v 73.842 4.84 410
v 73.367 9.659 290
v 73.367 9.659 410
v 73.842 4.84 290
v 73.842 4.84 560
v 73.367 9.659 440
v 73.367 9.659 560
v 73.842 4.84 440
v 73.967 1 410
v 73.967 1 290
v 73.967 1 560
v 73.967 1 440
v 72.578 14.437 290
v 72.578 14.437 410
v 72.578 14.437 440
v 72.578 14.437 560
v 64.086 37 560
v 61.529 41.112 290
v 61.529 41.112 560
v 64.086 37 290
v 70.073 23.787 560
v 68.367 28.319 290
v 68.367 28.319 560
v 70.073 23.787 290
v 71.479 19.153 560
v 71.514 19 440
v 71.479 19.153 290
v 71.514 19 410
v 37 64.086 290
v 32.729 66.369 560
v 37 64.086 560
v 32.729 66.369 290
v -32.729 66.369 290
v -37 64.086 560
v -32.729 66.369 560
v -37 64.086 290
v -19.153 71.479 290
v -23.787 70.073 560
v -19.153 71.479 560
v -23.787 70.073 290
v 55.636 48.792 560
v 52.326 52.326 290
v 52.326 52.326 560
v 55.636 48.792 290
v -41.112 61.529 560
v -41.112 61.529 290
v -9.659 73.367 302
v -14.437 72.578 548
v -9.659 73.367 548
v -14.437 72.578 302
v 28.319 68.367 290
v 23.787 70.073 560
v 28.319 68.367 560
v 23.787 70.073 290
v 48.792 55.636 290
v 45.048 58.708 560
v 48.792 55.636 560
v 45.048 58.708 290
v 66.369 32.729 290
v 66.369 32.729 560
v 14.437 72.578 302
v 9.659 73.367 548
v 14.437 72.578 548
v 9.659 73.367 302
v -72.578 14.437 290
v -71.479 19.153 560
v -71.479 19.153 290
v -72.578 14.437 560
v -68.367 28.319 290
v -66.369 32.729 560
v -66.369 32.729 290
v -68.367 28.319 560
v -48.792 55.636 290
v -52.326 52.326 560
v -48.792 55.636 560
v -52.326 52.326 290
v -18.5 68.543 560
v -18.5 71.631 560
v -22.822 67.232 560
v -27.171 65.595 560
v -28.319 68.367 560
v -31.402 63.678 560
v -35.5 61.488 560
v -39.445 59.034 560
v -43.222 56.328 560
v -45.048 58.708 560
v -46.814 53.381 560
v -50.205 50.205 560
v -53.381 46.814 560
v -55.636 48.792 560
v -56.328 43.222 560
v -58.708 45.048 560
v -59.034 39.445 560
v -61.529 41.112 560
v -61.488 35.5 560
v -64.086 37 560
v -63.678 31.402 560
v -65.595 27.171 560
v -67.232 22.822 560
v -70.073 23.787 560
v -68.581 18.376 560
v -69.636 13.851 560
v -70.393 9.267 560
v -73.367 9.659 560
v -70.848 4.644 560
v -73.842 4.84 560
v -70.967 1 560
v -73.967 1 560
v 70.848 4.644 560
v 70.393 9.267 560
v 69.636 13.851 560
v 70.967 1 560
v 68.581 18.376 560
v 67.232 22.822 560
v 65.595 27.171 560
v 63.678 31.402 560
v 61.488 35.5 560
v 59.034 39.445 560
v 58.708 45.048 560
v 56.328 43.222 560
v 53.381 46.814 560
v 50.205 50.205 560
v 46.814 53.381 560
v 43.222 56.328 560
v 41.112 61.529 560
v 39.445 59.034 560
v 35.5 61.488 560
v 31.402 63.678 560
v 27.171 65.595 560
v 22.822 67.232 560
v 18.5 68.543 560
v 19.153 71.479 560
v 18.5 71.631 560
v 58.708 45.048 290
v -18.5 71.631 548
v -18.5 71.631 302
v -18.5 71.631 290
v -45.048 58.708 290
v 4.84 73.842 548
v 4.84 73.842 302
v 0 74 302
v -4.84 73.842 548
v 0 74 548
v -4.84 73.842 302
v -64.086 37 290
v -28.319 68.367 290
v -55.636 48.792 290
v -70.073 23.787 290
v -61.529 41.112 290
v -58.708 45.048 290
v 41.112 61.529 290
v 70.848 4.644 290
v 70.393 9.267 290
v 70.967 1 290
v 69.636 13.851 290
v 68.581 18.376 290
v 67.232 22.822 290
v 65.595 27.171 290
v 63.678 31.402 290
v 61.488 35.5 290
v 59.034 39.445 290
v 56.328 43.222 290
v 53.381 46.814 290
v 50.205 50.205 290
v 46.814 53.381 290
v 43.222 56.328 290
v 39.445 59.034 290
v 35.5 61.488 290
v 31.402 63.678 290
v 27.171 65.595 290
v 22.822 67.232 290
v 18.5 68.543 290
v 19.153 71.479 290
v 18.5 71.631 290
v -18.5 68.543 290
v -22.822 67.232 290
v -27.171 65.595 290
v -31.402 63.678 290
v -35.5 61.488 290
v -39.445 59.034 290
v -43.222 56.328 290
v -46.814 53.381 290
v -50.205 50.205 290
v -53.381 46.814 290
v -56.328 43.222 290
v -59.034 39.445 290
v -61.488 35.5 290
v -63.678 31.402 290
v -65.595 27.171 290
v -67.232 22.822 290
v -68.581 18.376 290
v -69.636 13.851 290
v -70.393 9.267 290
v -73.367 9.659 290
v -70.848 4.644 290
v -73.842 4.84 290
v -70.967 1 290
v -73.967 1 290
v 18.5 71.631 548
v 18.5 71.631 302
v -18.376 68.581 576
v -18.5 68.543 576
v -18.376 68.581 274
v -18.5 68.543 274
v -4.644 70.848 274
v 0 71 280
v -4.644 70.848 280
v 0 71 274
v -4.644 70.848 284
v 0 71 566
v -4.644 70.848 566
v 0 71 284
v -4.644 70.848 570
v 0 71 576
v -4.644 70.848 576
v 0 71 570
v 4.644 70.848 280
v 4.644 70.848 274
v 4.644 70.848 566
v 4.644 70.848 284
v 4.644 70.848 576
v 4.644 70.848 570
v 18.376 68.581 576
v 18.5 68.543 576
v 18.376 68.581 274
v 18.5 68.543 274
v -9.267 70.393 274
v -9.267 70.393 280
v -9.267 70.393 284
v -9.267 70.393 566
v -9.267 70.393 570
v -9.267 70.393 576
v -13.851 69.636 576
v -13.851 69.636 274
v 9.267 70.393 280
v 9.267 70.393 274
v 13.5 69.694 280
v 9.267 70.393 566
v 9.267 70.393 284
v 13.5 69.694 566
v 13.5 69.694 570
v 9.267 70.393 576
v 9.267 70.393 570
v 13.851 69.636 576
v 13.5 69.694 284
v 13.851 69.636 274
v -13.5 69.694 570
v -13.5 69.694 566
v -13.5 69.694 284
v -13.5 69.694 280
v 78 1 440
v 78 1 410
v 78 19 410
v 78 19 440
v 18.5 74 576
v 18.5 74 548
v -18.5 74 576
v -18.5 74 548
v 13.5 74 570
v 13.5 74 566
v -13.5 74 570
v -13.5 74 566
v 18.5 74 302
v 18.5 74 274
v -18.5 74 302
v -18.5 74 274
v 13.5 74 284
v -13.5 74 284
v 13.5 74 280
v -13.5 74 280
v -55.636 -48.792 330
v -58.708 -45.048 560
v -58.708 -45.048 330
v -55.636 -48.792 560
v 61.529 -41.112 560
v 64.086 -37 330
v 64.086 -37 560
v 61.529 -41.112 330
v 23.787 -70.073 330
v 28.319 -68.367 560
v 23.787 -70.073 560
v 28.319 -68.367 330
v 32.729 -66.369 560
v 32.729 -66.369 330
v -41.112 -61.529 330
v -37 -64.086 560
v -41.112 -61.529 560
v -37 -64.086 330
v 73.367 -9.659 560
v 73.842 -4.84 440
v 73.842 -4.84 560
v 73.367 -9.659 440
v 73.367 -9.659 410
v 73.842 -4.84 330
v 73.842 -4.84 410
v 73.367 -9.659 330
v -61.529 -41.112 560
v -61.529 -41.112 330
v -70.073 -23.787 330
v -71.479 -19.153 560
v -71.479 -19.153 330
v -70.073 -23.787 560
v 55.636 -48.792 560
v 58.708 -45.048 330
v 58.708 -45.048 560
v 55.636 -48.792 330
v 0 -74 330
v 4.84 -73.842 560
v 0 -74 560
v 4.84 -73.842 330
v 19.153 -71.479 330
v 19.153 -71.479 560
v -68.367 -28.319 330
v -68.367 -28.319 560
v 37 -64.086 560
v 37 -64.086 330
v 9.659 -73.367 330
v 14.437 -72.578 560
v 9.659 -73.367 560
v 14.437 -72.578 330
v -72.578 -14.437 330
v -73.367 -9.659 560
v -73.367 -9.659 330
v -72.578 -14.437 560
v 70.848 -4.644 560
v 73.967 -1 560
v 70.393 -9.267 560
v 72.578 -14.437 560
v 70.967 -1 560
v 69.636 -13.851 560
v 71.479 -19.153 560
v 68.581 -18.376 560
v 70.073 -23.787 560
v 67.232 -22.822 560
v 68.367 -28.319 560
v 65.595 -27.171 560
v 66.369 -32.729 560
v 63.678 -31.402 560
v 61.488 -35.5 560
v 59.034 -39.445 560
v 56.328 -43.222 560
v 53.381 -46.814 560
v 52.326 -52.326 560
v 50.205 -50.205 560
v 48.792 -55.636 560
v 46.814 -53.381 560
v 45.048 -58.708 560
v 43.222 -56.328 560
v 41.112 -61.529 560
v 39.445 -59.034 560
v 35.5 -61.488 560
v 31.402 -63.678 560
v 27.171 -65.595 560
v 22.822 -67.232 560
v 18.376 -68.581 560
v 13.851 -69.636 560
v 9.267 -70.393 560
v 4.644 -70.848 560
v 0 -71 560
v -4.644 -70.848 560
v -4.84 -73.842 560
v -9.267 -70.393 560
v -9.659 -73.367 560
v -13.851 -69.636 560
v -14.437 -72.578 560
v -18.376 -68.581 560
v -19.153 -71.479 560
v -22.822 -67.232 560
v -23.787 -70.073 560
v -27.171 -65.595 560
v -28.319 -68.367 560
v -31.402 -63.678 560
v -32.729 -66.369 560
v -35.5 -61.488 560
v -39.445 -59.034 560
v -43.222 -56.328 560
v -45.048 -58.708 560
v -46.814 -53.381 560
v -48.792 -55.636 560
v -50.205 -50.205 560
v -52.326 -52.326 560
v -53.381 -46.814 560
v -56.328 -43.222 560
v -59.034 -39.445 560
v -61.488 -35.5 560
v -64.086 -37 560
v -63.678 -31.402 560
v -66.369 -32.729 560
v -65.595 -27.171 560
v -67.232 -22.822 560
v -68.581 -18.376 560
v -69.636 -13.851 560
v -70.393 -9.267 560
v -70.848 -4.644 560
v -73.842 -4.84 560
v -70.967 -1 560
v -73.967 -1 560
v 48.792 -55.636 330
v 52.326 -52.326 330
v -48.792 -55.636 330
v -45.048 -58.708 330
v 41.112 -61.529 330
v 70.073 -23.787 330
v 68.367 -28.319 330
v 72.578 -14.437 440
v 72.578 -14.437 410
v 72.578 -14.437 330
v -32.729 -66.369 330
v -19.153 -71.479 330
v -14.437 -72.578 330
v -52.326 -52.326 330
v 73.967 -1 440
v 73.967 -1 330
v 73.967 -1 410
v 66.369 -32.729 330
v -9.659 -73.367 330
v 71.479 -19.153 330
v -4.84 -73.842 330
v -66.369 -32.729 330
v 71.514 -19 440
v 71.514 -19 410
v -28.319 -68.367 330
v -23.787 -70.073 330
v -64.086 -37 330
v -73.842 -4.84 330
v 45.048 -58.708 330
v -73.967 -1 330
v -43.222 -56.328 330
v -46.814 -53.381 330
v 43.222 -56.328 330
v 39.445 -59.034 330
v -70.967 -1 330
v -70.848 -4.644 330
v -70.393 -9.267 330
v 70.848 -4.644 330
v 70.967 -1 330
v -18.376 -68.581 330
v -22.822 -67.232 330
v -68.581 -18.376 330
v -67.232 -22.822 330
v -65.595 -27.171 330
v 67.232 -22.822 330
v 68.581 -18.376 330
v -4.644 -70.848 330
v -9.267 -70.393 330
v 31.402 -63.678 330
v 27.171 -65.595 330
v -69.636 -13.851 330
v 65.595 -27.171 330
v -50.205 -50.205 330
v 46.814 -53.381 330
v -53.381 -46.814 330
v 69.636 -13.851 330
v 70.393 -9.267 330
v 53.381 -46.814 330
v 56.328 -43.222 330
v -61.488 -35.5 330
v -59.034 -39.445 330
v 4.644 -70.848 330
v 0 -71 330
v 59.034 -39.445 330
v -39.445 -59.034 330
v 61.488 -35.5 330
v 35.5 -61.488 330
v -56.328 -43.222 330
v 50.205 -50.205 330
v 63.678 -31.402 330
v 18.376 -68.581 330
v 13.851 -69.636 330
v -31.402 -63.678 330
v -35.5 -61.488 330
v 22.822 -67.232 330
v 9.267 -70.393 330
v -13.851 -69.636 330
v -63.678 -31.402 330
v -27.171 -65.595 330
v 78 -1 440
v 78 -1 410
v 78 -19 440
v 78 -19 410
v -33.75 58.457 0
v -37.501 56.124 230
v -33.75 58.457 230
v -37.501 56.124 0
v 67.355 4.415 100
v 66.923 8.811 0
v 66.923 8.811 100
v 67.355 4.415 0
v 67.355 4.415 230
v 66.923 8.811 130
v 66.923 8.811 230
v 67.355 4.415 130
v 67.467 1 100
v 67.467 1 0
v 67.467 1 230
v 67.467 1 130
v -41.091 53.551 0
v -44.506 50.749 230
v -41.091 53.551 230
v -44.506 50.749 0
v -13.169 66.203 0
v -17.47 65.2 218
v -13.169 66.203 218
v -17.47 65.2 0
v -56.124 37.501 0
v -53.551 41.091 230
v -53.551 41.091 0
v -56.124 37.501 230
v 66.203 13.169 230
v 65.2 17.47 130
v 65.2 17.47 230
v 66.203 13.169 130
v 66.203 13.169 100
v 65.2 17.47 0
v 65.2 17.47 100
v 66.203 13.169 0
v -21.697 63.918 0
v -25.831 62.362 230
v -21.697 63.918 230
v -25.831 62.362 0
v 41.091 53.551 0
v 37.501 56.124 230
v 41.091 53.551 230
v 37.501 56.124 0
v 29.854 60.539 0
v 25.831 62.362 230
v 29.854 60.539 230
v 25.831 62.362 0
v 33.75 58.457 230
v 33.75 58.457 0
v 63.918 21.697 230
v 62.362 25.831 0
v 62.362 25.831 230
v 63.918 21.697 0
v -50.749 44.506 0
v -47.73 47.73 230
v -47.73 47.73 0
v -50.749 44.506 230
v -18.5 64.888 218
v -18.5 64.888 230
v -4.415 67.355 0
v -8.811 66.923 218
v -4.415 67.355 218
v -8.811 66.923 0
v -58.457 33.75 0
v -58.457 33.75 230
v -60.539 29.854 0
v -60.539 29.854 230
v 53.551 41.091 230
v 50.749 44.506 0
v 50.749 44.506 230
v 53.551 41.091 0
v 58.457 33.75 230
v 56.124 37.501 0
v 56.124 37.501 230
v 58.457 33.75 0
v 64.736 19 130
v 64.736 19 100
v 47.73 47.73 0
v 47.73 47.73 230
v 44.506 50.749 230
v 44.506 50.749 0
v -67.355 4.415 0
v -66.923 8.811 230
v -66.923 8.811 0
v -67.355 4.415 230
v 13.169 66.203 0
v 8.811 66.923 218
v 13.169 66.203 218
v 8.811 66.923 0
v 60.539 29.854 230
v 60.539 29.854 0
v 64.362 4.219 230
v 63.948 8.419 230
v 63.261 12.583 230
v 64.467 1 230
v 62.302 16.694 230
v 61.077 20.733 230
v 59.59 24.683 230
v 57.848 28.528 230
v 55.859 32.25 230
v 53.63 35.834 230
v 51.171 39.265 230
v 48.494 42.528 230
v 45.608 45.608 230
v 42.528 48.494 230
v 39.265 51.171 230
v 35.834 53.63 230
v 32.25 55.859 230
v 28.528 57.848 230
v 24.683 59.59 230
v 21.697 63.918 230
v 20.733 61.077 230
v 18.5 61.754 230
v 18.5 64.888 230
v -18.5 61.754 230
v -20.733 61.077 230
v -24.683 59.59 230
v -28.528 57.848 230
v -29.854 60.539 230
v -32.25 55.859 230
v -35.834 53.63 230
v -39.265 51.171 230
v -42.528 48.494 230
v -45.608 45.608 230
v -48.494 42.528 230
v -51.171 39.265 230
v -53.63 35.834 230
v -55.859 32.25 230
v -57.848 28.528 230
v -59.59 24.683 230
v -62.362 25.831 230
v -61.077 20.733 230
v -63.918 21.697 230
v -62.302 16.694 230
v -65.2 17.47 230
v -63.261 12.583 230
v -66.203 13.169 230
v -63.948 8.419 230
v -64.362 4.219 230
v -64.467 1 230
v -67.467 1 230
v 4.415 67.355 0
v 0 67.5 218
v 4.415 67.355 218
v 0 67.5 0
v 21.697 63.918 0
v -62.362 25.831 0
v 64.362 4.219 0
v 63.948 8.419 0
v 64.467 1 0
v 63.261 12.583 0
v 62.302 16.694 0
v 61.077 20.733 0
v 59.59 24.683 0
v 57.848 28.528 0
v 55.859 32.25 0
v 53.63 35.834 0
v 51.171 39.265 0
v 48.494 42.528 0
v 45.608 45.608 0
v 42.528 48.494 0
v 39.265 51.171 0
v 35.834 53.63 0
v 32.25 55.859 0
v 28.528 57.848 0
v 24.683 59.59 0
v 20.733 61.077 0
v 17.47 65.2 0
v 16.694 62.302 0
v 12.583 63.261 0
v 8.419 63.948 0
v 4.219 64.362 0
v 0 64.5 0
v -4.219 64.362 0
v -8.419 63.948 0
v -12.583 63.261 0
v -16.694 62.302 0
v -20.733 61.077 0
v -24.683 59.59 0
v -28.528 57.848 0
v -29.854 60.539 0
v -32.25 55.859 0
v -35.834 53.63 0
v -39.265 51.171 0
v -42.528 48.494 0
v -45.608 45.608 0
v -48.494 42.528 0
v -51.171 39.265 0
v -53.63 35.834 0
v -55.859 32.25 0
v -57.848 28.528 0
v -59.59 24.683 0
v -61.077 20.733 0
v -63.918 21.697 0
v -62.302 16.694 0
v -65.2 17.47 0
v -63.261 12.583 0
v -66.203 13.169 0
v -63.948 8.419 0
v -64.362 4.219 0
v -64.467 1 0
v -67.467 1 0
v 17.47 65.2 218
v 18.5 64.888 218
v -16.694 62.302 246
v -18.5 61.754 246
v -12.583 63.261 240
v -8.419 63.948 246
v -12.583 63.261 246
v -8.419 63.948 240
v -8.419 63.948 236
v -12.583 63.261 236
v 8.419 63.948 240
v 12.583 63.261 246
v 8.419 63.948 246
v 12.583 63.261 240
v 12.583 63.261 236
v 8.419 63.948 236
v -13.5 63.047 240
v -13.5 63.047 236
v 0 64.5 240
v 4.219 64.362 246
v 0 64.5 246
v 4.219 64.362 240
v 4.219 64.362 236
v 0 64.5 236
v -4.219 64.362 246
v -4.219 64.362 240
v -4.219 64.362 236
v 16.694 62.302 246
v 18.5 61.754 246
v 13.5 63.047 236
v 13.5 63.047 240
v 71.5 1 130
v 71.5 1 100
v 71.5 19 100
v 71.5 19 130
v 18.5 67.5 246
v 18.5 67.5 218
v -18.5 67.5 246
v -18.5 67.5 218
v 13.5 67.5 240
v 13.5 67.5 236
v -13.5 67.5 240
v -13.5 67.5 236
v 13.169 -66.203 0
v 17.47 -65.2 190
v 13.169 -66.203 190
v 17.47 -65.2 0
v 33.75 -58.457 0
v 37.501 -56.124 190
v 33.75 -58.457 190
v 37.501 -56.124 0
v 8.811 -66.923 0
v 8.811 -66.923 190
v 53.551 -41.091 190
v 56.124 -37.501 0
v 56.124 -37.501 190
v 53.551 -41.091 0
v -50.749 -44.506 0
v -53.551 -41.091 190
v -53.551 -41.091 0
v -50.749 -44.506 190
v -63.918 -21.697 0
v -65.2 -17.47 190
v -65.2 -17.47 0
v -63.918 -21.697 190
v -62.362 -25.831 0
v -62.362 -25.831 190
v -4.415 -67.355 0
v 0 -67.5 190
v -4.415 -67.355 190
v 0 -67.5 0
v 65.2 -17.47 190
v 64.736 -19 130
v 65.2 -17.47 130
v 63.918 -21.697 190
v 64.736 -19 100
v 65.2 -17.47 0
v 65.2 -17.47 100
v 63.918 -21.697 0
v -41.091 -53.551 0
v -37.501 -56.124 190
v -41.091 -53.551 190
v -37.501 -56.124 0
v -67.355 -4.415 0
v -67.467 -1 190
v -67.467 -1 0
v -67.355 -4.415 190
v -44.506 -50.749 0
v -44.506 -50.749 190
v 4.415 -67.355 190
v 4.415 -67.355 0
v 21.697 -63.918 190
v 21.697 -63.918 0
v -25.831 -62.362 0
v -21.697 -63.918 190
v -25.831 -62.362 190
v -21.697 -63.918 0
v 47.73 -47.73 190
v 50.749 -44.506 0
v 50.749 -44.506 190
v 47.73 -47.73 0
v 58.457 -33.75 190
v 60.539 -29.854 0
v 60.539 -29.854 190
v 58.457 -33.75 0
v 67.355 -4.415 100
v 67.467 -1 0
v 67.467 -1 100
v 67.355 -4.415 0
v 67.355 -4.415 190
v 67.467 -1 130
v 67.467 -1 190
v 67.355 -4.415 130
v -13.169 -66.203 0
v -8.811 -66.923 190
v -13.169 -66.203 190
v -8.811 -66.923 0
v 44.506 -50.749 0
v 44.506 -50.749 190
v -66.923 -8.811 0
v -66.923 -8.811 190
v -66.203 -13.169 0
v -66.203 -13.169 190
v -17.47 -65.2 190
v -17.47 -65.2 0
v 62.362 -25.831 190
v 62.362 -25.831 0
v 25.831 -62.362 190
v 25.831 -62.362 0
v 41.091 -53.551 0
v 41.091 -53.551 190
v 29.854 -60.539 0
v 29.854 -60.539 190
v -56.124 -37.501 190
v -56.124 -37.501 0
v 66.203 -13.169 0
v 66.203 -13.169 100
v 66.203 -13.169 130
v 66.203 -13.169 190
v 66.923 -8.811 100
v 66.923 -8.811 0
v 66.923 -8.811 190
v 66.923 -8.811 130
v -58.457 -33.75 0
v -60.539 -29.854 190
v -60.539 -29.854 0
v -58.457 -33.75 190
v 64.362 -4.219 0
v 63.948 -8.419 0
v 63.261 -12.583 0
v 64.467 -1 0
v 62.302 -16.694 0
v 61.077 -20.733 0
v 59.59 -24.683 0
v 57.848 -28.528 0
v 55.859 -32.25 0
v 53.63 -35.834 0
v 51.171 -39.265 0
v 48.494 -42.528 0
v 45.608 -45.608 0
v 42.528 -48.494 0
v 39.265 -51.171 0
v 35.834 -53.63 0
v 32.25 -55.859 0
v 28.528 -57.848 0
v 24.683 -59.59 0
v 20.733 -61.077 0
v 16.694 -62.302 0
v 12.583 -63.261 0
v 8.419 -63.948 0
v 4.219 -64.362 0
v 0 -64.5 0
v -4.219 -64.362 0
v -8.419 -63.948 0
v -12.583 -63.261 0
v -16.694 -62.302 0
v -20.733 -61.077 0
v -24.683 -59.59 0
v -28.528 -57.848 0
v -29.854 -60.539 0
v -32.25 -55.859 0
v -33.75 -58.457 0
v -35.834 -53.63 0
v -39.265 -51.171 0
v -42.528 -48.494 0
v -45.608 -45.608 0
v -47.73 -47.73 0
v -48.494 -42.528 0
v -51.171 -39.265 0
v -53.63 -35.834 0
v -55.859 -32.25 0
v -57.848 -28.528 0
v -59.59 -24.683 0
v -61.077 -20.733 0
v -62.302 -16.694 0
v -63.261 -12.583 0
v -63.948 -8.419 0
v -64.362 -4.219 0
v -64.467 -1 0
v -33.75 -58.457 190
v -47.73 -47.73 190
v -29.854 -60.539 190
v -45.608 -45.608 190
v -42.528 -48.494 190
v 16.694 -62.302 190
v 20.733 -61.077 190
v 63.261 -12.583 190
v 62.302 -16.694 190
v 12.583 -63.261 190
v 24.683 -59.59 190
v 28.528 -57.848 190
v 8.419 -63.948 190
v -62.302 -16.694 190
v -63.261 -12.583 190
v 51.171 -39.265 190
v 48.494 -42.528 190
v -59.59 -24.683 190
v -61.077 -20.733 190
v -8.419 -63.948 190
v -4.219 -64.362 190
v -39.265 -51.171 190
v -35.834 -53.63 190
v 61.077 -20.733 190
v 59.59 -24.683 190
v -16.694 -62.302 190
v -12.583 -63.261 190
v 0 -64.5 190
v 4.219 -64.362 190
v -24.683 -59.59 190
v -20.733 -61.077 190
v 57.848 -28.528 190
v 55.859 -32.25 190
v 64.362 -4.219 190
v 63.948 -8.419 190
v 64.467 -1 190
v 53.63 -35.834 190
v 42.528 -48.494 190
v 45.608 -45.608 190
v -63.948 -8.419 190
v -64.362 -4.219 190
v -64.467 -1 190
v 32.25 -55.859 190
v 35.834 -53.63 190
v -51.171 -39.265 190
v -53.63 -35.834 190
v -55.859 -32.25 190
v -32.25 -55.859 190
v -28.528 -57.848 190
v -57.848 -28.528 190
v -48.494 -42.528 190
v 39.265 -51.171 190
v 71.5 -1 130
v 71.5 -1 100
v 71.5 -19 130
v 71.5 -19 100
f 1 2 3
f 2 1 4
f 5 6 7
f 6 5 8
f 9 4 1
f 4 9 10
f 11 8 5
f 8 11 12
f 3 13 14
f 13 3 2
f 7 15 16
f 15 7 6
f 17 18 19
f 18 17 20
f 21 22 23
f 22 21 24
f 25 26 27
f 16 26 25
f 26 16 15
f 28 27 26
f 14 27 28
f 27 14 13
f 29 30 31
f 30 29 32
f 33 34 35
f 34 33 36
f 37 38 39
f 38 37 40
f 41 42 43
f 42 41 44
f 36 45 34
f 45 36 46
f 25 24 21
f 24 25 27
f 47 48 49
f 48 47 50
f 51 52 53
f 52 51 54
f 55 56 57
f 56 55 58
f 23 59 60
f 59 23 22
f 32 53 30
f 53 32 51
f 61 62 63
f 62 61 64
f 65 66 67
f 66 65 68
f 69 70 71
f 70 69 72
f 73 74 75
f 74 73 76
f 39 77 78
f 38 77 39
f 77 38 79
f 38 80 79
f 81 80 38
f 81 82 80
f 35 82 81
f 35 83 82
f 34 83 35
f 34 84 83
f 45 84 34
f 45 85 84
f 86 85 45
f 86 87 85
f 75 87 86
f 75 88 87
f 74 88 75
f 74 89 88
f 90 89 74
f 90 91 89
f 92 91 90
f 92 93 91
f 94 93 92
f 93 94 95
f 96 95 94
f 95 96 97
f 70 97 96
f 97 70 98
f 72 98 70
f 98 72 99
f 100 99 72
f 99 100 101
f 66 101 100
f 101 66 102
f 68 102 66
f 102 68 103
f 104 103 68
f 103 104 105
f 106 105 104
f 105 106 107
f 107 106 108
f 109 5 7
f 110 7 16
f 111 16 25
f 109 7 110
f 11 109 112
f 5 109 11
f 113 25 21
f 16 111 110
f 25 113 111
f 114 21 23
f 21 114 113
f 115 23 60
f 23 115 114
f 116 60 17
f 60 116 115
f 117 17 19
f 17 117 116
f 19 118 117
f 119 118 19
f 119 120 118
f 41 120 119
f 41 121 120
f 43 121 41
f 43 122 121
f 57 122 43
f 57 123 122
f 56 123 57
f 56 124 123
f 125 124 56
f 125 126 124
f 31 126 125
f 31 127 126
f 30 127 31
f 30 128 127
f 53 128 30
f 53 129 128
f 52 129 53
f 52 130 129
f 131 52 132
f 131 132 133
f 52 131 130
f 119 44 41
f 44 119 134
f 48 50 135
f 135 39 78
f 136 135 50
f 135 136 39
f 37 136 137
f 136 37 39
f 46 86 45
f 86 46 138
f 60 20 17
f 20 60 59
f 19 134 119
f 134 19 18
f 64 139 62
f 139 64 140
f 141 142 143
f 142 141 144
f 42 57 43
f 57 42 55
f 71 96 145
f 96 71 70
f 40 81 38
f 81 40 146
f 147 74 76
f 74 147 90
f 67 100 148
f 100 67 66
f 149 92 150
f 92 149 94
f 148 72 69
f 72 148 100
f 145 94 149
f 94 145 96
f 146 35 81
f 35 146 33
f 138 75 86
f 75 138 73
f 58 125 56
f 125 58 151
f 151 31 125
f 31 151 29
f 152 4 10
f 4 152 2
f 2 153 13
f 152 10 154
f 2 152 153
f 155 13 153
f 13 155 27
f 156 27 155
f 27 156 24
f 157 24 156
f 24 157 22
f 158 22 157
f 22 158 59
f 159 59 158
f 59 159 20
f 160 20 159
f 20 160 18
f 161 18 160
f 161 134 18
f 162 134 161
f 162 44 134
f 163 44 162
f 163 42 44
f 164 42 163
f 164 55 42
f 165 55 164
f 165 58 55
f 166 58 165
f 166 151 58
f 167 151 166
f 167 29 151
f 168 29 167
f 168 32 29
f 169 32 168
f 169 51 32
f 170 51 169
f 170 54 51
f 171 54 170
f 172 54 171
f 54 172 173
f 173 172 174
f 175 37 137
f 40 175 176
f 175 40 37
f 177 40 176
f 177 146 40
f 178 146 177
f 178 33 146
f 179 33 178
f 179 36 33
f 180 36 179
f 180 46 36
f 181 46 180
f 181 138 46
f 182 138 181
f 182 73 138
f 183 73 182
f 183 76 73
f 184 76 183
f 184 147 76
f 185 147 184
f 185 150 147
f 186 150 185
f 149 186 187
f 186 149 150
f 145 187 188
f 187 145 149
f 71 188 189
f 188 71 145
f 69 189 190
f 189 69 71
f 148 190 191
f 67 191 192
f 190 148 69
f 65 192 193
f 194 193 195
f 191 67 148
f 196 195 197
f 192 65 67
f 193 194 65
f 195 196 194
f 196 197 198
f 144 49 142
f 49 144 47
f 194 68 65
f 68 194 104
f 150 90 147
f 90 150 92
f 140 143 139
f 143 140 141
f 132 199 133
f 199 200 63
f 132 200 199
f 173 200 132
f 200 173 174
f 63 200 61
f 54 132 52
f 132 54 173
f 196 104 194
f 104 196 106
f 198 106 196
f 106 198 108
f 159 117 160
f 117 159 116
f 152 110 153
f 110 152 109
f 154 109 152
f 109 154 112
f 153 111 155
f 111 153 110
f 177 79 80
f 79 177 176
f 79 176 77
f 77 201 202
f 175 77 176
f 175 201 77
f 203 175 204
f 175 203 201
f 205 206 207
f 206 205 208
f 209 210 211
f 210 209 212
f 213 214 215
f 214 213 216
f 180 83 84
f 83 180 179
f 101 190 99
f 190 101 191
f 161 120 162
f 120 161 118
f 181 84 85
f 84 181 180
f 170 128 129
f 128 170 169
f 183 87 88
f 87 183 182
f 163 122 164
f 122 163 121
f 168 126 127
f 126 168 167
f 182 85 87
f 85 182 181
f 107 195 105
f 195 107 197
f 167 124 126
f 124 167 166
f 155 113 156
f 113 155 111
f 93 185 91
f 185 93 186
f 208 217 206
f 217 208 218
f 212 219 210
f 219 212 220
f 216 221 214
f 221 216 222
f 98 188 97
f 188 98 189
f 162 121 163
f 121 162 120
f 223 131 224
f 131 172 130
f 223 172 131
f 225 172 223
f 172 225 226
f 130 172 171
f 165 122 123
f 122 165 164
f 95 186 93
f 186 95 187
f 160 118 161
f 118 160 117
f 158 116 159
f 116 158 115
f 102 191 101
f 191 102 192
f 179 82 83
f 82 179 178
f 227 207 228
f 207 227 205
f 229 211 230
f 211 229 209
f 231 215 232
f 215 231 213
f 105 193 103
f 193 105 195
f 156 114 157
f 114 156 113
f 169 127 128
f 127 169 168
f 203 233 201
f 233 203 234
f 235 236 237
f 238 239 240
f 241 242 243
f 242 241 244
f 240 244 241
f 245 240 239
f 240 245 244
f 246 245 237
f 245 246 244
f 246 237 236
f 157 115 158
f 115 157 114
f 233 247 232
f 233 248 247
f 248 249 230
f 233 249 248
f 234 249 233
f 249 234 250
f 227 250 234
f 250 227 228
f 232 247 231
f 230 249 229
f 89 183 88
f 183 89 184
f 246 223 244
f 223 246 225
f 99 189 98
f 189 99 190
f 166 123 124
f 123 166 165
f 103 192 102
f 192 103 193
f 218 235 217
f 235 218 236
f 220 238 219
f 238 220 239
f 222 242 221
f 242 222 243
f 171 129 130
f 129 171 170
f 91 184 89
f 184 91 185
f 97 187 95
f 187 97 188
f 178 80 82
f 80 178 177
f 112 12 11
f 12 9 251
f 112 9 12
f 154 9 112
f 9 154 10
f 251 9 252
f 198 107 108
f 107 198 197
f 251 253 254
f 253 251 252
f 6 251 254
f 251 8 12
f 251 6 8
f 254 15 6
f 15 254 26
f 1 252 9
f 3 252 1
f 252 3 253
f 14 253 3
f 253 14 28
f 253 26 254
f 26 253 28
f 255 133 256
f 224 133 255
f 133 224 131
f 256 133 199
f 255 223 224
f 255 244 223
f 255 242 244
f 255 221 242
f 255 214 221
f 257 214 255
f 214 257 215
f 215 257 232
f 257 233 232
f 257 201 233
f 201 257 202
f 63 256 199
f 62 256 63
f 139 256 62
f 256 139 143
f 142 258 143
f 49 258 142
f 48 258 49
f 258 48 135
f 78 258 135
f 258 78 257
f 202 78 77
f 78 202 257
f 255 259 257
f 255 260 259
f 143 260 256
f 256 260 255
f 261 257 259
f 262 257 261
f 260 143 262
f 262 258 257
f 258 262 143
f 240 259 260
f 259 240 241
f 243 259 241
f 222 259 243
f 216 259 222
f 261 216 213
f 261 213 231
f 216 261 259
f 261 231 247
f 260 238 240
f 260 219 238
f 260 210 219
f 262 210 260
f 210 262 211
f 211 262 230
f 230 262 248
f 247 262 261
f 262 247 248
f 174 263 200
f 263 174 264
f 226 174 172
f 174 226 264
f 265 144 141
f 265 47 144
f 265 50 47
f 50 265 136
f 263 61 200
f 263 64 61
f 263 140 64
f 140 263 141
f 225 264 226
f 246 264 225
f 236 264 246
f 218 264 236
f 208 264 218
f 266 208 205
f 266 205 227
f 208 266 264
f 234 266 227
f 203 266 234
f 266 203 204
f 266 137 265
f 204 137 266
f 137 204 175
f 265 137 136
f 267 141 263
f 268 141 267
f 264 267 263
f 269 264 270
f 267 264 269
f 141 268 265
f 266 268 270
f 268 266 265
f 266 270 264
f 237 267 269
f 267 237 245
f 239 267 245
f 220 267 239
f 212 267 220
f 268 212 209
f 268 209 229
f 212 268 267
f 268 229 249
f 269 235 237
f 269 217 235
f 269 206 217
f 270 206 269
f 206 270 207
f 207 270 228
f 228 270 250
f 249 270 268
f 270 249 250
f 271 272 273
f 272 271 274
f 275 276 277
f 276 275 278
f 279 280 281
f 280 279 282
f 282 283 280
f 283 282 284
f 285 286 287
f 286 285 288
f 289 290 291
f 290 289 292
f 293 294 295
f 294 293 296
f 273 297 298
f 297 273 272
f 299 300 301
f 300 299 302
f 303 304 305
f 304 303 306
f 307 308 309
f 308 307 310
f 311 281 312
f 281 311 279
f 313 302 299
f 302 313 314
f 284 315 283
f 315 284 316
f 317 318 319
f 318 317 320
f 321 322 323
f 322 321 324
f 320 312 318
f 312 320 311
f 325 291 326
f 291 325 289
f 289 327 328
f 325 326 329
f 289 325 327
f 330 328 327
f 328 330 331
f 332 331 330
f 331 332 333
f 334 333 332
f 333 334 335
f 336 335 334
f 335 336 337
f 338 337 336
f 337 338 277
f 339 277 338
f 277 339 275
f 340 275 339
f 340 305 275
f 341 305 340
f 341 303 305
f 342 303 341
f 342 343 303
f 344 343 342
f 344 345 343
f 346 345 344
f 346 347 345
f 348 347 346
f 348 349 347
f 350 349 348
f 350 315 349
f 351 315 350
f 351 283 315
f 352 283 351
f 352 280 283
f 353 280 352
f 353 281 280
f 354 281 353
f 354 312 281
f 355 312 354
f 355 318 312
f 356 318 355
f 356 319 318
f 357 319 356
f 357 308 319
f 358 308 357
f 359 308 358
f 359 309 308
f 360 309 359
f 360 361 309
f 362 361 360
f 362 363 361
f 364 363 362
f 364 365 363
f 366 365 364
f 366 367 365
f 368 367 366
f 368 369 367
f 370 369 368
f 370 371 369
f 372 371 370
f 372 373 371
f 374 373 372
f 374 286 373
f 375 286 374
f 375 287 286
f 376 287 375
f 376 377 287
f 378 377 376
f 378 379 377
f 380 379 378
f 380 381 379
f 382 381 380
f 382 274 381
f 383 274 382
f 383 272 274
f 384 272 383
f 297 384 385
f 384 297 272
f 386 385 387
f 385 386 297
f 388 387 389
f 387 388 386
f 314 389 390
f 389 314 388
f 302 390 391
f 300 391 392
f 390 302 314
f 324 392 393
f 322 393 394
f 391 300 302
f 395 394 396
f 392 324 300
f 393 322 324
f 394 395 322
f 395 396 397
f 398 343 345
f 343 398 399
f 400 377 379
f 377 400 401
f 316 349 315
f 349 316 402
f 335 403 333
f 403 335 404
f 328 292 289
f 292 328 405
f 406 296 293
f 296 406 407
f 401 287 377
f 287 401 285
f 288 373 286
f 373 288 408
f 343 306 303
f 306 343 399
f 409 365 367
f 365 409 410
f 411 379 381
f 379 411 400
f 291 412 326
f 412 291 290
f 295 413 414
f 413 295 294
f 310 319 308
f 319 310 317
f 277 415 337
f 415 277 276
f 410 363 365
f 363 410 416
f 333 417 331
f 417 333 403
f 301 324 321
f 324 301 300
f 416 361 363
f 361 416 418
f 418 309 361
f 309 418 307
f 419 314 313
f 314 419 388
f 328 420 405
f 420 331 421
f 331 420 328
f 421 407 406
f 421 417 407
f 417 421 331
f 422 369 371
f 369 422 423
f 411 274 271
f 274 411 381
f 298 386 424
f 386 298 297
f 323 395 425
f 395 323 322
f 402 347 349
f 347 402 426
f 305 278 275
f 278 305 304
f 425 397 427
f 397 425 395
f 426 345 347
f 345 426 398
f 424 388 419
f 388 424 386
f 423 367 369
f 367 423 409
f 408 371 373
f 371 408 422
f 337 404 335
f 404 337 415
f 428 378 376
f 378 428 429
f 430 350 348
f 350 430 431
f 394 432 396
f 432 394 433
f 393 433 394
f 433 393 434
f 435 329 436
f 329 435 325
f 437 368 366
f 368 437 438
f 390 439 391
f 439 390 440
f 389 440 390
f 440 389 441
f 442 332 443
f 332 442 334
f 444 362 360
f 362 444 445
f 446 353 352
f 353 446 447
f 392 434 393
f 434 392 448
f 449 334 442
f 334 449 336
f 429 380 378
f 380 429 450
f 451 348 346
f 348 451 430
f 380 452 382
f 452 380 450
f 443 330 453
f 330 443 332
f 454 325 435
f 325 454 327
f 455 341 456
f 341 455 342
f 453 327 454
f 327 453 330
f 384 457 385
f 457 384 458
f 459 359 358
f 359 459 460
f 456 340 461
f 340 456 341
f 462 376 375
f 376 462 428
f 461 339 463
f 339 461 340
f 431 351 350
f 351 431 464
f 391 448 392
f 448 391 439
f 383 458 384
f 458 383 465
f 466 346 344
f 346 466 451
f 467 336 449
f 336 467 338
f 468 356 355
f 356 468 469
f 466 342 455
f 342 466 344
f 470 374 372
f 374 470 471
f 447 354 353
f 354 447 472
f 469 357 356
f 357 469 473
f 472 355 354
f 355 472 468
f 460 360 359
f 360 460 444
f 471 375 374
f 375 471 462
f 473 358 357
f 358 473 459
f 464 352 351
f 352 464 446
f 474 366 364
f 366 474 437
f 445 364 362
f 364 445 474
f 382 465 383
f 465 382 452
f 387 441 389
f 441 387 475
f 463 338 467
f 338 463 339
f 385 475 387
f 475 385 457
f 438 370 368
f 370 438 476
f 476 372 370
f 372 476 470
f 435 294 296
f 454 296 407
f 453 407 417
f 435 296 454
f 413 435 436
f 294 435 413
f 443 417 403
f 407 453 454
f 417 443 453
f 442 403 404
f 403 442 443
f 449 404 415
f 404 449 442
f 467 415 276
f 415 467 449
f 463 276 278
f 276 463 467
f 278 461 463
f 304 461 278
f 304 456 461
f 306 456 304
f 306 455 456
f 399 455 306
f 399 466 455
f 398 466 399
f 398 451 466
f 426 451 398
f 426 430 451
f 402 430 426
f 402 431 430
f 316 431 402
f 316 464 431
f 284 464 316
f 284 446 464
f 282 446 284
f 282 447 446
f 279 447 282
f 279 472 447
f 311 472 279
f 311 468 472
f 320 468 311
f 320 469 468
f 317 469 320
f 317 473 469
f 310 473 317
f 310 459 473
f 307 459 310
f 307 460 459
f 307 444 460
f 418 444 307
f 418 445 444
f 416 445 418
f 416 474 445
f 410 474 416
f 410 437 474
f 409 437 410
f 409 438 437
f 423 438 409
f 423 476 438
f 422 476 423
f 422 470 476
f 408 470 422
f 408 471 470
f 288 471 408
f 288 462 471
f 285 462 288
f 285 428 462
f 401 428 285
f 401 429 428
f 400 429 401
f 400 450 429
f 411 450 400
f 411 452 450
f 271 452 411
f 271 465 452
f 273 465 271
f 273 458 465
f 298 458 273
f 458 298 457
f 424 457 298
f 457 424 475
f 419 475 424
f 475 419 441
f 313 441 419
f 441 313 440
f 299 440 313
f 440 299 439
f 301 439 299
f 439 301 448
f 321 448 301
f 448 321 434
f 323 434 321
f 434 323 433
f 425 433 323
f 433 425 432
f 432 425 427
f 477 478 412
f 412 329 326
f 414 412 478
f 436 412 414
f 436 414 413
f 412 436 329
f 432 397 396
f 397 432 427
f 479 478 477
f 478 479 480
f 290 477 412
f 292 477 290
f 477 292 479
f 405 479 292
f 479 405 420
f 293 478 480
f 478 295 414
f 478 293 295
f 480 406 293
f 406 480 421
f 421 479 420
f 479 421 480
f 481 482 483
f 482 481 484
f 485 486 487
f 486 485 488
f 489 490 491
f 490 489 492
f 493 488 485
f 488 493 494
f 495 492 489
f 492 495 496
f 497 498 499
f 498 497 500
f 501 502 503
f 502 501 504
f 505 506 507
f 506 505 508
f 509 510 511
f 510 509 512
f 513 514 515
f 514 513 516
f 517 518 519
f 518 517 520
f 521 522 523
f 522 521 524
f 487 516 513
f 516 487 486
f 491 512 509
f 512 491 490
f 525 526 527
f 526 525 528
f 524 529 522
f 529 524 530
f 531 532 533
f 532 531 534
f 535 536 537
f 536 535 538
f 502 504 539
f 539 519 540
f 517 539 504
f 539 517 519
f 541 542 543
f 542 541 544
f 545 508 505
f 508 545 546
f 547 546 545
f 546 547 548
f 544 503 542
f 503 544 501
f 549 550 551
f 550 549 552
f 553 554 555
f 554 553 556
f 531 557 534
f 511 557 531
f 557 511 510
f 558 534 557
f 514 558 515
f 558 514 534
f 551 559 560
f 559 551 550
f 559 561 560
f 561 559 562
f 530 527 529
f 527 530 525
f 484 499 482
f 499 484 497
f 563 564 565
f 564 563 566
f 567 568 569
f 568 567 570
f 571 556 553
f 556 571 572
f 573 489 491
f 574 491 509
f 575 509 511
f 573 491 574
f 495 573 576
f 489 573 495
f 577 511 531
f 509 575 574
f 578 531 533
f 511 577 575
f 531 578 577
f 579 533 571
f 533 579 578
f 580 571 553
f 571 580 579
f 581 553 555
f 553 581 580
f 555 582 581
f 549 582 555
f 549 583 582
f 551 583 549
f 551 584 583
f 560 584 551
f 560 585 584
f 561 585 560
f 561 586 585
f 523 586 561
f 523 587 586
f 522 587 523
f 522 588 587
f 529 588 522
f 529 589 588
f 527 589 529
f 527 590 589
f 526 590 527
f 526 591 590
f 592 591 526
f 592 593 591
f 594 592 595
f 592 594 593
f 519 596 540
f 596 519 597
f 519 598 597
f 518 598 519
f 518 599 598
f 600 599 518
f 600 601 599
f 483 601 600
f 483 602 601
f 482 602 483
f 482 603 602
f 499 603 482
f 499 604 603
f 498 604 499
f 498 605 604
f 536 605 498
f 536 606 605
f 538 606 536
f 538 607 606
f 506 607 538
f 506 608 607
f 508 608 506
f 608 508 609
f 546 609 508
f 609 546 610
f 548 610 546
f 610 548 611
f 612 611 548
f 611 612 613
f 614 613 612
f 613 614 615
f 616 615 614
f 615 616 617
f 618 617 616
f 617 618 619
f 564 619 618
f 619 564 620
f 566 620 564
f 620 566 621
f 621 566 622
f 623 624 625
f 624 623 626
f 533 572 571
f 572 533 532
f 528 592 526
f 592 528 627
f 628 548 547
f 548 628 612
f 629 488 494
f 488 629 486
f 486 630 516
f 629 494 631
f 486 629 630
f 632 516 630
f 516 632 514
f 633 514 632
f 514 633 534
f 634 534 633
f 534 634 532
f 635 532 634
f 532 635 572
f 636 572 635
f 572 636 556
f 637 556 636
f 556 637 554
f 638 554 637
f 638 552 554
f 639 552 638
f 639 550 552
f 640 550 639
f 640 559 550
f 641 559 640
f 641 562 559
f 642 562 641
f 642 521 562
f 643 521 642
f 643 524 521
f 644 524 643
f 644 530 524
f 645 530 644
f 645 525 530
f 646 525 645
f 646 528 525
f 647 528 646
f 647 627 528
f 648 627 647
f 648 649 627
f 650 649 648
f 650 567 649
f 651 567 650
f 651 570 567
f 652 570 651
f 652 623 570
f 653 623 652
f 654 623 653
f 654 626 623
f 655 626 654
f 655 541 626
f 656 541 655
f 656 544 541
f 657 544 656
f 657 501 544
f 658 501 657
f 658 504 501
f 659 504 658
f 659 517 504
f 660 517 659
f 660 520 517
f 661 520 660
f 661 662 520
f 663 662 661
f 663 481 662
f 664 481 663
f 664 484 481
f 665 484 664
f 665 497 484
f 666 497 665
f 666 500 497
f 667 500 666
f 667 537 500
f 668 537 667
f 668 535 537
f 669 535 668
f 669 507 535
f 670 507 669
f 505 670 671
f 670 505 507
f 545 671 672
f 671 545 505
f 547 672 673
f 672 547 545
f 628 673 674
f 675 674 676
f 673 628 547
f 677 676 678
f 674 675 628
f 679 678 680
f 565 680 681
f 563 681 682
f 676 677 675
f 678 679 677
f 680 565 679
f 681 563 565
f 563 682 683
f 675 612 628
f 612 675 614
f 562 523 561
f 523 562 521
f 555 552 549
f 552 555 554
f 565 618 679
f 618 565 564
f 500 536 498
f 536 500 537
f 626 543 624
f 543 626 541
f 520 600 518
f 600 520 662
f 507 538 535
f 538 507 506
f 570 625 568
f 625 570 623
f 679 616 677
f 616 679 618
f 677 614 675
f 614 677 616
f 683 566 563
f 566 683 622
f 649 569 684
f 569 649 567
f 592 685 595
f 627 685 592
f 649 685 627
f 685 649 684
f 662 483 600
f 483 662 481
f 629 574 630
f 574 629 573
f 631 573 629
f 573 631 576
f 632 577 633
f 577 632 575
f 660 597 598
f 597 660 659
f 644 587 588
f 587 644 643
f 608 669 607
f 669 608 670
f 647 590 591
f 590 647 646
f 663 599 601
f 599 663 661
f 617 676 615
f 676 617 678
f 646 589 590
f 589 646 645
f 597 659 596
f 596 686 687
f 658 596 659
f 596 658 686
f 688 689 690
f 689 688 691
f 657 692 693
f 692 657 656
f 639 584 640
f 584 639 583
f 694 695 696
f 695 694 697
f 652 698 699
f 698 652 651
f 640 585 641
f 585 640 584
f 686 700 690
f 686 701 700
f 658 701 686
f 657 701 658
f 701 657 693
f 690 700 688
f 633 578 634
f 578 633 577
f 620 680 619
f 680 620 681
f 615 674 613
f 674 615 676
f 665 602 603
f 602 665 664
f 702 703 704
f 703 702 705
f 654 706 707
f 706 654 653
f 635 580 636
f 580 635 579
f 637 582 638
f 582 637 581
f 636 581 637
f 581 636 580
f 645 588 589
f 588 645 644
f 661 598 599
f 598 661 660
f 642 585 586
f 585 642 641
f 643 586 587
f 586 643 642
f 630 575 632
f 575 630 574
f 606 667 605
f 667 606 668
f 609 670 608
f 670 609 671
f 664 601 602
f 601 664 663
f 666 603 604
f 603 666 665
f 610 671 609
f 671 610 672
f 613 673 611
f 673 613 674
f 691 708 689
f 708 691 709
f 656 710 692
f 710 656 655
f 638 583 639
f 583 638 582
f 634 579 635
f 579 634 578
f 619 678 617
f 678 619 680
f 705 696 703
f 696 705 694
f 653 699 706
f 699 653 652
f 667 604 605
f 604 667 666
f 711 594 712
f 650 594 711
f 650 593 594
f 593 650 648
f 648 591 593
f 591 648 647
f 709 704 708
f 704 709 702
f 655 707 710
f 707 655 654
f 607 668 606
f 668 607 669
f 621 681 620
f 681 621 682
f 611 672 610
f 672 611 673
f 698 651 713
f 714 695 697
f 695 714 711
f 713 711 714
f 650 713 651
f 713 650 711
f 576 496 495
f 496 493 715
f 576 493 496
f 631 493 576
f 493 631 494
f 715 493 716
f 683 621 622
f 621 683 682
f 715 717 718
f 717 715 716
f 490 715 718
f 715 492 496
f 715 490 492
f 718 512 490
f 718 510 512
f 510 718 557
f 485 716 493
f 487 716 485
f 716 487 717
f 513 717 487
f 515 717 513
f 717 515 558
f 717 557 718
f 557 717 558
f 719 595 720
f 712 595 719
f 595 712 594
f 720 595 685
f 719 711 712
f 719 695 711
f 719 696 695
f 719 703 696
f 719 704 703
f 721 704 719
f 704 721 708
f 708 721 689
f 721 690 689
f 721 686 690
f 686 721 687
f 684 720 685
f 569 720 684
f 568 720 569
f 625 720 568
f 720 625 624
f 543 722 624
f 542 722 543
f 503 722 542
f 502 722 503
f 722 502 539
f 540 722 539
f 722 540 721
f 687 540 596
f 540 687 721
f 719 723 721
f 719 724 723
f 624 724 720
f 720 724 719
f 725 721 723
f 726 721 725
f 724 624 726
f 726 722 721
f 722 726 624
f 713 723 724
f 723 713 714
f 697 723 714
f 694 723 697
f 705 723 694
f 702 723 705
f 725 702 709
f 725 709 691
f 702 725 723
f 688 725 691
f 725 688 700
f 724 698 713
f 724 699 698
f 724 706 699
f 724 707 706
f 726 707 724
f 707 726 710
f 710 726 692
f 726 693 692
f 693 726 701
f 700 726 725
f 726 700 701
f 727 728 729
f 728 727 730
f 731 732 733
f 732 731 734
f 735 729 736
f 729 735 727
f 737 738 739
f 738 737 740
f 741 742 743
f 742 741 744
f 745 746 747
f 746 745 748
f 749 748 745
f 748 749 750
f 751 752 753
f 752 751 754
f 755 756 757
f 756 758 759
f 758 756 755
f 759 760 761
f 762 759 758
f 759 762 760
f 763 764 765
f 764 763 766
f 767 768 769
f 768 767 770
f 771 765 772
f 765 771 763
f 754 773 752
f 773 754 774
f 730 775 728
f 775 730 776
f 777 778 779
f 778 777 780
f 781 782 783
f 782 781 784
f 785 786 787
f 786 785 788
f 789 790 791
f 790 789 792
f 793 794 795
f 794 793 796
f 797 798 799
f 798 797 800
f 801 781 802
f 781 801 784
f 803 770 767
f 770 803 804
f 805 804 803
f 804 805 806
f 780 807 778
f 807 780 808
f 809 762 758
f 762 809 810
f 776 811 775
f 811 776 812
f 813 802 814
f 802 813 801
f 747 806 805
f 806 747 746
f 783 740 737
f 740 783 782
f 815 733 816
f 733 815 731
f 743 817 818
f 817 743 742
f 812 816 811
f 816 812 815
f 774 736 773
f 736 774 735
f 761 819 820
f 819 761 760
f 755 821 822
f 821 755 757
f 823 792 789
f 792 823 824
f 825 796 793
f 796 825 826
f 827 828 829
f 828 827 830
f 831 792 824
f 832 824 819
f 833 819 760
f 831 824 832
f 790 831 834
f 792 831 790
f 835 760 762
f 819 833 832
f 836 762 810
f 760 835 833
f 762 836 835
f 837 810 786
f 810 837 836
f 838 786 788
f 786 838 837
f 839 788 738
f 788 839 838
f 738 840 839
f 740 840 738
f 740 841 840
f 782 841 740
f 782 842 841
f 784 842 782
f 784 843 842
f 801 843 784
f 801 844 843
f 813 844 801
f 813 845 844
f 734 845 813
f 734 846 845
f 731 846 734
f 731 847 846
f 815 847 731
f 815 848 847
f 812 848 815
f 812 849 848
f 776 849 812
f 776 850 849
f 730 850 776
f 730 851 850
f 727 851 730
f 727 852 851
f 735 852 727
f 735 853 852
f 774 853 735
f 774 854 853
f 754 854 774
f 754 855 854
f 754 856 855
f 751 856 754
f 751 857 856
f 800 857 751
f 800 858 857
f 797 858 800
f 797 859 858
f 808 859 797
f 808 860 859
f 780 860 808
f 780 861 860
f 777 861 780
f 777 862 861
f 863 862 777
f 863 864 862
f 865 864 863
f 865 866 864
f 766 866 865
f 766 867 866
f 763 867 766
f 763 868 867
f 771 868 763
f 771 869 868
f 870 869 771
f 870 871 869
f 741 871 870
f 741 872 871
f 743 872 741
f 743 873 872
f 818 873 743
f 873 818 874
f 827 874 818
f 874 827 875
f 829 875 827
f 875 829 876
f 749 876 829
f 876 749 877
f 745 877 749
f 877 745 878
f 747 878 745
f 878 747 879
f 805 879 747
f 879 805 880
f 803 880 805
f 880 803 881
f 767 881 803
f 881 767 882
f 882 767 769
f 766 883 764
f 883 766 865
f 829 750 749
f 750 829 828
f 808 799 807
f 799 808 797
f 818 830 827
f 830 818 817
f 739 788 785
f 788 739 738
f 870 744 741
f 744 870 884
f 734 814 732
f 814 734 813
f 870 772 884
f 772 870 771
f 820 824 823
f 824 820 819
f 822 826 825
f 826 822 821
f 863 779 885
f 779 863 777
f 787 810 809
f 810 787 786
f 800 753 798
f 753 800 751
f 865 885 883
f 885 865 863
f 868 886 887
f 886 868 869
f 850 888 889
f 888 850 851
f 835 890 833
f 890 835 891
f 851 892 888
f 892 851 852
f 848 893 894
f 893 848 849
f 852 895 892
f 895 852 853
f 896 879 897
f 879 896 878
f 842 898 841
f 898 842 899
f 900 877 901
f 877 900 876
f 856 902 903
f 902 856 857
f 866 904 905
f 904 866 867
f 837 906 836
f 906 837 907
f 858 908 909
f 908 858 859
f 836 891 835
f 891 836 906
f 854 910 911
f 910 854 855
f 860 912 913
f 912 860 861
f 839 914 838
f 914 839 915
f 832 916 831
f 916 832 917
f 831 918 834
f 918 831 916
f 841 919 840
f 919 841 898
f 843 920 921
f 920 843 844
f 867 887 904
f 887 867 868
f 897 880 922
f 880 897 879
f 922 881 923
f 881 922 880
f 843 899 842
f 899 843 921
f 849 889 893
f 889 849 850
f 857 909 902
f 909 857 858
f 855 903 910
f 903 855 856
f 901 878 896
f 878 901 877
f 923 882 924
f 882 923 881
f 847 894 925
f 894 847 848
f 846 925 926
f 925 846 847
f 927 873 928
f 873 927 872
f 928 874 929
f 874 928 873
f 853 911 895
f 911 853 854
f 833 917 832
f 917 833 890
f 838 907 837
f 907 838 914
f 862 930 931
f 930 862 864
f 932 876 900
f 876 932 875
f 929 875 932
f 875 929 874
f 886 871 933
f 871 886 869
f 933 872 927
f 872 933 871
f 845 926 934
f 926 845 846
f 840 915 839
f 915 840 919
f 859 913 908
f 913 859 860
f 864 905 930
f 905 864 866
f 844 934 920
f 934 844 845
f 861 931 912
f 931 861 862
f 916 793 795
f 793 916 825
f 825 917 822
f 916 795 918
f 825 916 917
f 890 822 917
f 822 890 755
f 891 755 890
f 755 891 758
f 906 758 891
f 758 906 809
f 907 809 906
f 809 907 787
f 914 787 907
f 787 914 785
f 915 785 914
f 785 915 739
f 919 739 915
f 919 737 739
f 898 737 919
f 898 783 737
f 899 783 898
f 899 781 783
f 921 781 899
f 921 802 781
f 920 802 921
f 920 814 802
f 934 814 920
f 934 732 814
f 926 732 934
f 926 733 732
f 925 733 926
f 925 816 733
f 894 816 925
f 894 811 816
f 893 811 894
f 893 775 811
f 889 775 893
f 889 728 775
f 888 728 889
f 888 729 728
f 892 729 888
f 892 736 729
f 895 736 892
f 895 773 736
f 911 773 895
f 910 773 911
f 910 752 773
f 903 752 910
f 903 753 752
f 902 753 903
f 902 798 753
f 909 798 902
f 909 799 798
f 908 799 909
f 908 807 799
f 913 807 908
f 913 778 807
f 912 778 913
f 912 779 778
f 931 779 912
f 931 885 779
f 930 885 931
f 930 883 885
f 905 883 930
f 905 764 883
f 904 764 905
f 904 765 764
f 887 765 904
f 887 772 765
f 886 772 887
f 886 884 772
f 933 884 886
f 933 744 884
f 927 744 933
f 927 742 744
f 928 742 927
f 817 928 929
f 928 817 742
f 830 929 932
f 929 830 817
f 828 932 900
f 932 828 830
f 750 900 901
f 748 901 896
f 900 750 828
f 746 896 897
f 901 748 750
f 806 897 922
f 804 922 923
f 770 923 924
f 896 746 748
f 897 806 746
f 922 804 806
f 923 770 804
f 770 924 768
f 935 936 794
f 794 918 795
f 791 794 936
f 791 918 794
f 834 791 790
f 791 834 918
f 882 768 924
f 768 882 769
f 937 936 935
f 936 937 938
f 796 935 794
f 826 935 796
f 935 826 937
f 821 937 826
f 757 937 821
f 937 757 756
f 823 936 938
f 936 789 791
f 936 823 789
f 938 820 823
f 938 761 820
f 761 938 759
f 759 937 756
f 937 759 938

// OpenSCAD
// file: Parameters.scad
// SYNTHETIC DESIGN EXAMPLE ONLY. Generate project dimensions with suit_clamshell.py.
// limbs_mm rows: upperarm_l/r, forearm_l/r, thigh_l/r, shin_l/r; [diameter, length].
wall_mm = 3;
seam_gap_mm = 2;
hinge_offset_mm = 8;
opening_deg = 110;
elbow_gap_mm = 60;
elbow_relief_mm = 40;
strap_width_mm = 25;
latch_pad_mm = [30, 18, 4];
limbs_mm = [[148, 270], [148, 270], [135, 230], [135, 230], [221, 380], [221, 380], [164, 365], [164, 365]];
// main file
// Arm module: upper-arm and forearm opening envelopes that stay together as one unit.
// Concept envelopes only. No authentic armor, real hinge, purchased latch or load approval.
include <Parameters.scad>

side = "l";
open_fraction = 0;
elbow_flex_deg = 0;
piece = "assembly";
segment = "both";
$fn = 96;

assert(side == "l" || side == "r", "side must be l or r");
assert(piece == "assembly" || piece == "rear" || piece == "front", "piece must be assembly, rear or front");
assert(segment == "both" || segment == "upperarm" || segment == "forearm", "segment must be both, upperarm or forearm");
assert(is_num(open_fraction) && open_fraction >= 0 && open_fraction <= 1, "open_fraction must be 0..1");
assert(is_num(elbow_flex_deg) && elbow_flex_deg >= 0 && elbow_flex_deg <= 150, "elbow_flex_deg must be 0..150");
assert(is_num(wall_mm) && wall_mm > 0, "positive wall required");
assert(is_num(seam_gap_mm) && seam_gap_mm > 0, "positive seam gap required");
assert(is_num(hinge_offset_mm) && hinge_offset_mm >= 0, "nonnegative hinge offset required");
assert(is_num(opening_deg) && opening_deg > 0 && opening_deg <= 150, "opening angle must be 0..150 degrees");
assert(len(limbs_mm) == 8, "eight independent limb dimension pairs required");
assert(is_num(strap_width_mm) && strap_width_mm > 0, "positive strap width required");
assert(is_num(elbow_relief_mm) && elbow_relief_mm >= 0, "nonnegative elbow relief required");
assert(len(latch_pad_mm) == 3, "latch pad needs [length, width, thickness]");

handedness = side == "l" ? -1 : 1;
column = side == "l" ? 0 : 1;
upper = limbs_mm[column];
fore = limbs_mm[2 + column];
lug_margin = 6;
slot_height = 4;
lug_height = 2 * lug_margin + slot_height;
lug_overlap = 12;
assert(is_num(elbow_gap_mm) && elbow_gap_mm > 2 * lug_height, "elbow gap must clear both strap lugs");
assert(upper[0] > 2 * wall_mm + seam_gap_mm && fore[0] > 2 * wall_mm + seam_gap_mm, "invalid diameter");
assert(elbow_relief_mm < upper[1] / 3 && elbow_relief_mm < fore[1] / 3, "elbow relief too long for the shell");
assert(latch_pad_mm[0] < fore[1] - 2 * elbow_relief_mm, "latch pad longer than the front shell");

elbow_z = fore[1] + elbow_gap_mm / 2;
angle = handedness * open_fraction * opening_deg;
want_front = piece != "rear";
want_rear = piece != "front";

// Model axes: Z along the arm (hand end at 0), negative Y towards the front.
// The front half is shortened by elbow_relief_mm at the elbow end.
module half_shell(dims, front, low, high) {
    radius = dims[0] / 2;
    intersection() {
        difference() {
            cylinder(h = dims[1], r = radius);
            translate([0, 0, -1]) cylinder(h = dims[1] + 2, r = radius - wall_mm);
        }
        translate([-radius - 1, front ? -radius - 1 : seam_gap_mm / 2, front ? low : -1])
            cube([dims[0] + 2, radius + 1 - seam_gap_mm / 2, front ? high - low : dims[1] + 2]);
    }
}

// Flat mounting land for a purchased latch on the closing side, opposite the virtual hinge.
module latch_pad(dims, front) {
    radius = dims[0] / 2;
    difference() {
        translate([handedness > 0 ? -radius - latch_pad_mm[2] : radius - 6,
                   front ? -seam_gap_mm / 2 - latch_pad_mm[1] : seam_gap_mm / 2,
                   (dims[1] - latch_pad_mm[0]) / 2])
            cube([latch_pad_mm[2] + 6, latch_pad_mm[1], latch_pad_mm[0]]);
        translate([0, 0, -1]) cylinder(h = dims[1] + 2, r = radius - wall_mm);
    }
}

// Tab with a webbing slot at the rear of a shell end. direction 1 = beyond the upper end.
module strap_lug(dims, direction) {
    radius = dims[0] / 2;
    width = strap_width_mm + 2 * lug_margin;
    z_low = direction > 0 ? dims[1] - lug_overlap : -lug_height;
    slot_z = direction > 0 ? dims[1] + lug_margin : -lug_margin - slot_height;
    difference() {
        translate([-width / 2, radius - wall_mm - 3, z_low]) cube([width, wall_mm + 3, lug_overlap + lug_height]);
        translate([0, 0, z_low - 1]) cylinder(h = lug_overlap + lug_height + 2, r = radius - wall_mm);
        translate([-strap_width_mm / 2 - 1, radius - wall_mm - 10, slot_z]) cube([strap_width_mm + 2, wall_mm + 20, slot_height]);
    }
}

module shell_segment(dims, lug_top, lug_bottom, front_low, front_high) {
    hinge_x = handedness * (dims[0] / 2 + hinge_offset_mm);
    if (want_rear) color([0.19, 0.28, 0.20]) {
        half_shell(dims, false, 0, dims[1]);
        latch_pad(dims, false);
        if (lug_top) strap_lug(dims, 1);
        if (lug_bottom) strap_lug(dims, -1);
    }
    if (want_front)
        translate([hinge_x, 0, 0]) rotate([0, 0, angle]) translate([-hinge_x, 0, 0])
            color([0.45, 0.56, 0.28]) {
                half_shell(dims, true, front_low, front_high);
                latch_pad(dims, true);
            }
    // Preview-only virtual pivot: excluded from render/STL, not a printed axle.
    if ($preview && piece == "assembly")
        %translate([hinge_x, 0, -5]) cylinder(h = dims[1] + 10, r = 1.5);
}

// Upper arm: shoulder hang lug on top, elbow link lug below.
if (segment != "forearm")
    translate([0, 0, fore[1] + elbow_gap_mm])
        shell_segment(upper, true, true, elbow_relief_mm, upper[1]);

// Forearm: elbow link lug on top; the whole segment follows the elbow pose.
if (segment != "upperarm")
    translate([0, 0, elbow_z]) rotate([-elbow_flex_deg, 0, 0]) translate([0, 0, -elbow_z])
        shell_segment(fore, true, false, 0, fore[1] - elbow_relief_mm);

// Preview-only textile link across the elbow; the real link is webbing, not a printed part.
if ($preview && piece == "assembly" && segment == "both" && elbow_flex_deg == 0)
    %translate([-strap_width_mm / 2, max(upper[0], fore[0]) / 2, fore[1] + lug_margin])
        cube([strap_width_mm, 1.5, elbow_gap_mm - 2 * lug_margin]);
